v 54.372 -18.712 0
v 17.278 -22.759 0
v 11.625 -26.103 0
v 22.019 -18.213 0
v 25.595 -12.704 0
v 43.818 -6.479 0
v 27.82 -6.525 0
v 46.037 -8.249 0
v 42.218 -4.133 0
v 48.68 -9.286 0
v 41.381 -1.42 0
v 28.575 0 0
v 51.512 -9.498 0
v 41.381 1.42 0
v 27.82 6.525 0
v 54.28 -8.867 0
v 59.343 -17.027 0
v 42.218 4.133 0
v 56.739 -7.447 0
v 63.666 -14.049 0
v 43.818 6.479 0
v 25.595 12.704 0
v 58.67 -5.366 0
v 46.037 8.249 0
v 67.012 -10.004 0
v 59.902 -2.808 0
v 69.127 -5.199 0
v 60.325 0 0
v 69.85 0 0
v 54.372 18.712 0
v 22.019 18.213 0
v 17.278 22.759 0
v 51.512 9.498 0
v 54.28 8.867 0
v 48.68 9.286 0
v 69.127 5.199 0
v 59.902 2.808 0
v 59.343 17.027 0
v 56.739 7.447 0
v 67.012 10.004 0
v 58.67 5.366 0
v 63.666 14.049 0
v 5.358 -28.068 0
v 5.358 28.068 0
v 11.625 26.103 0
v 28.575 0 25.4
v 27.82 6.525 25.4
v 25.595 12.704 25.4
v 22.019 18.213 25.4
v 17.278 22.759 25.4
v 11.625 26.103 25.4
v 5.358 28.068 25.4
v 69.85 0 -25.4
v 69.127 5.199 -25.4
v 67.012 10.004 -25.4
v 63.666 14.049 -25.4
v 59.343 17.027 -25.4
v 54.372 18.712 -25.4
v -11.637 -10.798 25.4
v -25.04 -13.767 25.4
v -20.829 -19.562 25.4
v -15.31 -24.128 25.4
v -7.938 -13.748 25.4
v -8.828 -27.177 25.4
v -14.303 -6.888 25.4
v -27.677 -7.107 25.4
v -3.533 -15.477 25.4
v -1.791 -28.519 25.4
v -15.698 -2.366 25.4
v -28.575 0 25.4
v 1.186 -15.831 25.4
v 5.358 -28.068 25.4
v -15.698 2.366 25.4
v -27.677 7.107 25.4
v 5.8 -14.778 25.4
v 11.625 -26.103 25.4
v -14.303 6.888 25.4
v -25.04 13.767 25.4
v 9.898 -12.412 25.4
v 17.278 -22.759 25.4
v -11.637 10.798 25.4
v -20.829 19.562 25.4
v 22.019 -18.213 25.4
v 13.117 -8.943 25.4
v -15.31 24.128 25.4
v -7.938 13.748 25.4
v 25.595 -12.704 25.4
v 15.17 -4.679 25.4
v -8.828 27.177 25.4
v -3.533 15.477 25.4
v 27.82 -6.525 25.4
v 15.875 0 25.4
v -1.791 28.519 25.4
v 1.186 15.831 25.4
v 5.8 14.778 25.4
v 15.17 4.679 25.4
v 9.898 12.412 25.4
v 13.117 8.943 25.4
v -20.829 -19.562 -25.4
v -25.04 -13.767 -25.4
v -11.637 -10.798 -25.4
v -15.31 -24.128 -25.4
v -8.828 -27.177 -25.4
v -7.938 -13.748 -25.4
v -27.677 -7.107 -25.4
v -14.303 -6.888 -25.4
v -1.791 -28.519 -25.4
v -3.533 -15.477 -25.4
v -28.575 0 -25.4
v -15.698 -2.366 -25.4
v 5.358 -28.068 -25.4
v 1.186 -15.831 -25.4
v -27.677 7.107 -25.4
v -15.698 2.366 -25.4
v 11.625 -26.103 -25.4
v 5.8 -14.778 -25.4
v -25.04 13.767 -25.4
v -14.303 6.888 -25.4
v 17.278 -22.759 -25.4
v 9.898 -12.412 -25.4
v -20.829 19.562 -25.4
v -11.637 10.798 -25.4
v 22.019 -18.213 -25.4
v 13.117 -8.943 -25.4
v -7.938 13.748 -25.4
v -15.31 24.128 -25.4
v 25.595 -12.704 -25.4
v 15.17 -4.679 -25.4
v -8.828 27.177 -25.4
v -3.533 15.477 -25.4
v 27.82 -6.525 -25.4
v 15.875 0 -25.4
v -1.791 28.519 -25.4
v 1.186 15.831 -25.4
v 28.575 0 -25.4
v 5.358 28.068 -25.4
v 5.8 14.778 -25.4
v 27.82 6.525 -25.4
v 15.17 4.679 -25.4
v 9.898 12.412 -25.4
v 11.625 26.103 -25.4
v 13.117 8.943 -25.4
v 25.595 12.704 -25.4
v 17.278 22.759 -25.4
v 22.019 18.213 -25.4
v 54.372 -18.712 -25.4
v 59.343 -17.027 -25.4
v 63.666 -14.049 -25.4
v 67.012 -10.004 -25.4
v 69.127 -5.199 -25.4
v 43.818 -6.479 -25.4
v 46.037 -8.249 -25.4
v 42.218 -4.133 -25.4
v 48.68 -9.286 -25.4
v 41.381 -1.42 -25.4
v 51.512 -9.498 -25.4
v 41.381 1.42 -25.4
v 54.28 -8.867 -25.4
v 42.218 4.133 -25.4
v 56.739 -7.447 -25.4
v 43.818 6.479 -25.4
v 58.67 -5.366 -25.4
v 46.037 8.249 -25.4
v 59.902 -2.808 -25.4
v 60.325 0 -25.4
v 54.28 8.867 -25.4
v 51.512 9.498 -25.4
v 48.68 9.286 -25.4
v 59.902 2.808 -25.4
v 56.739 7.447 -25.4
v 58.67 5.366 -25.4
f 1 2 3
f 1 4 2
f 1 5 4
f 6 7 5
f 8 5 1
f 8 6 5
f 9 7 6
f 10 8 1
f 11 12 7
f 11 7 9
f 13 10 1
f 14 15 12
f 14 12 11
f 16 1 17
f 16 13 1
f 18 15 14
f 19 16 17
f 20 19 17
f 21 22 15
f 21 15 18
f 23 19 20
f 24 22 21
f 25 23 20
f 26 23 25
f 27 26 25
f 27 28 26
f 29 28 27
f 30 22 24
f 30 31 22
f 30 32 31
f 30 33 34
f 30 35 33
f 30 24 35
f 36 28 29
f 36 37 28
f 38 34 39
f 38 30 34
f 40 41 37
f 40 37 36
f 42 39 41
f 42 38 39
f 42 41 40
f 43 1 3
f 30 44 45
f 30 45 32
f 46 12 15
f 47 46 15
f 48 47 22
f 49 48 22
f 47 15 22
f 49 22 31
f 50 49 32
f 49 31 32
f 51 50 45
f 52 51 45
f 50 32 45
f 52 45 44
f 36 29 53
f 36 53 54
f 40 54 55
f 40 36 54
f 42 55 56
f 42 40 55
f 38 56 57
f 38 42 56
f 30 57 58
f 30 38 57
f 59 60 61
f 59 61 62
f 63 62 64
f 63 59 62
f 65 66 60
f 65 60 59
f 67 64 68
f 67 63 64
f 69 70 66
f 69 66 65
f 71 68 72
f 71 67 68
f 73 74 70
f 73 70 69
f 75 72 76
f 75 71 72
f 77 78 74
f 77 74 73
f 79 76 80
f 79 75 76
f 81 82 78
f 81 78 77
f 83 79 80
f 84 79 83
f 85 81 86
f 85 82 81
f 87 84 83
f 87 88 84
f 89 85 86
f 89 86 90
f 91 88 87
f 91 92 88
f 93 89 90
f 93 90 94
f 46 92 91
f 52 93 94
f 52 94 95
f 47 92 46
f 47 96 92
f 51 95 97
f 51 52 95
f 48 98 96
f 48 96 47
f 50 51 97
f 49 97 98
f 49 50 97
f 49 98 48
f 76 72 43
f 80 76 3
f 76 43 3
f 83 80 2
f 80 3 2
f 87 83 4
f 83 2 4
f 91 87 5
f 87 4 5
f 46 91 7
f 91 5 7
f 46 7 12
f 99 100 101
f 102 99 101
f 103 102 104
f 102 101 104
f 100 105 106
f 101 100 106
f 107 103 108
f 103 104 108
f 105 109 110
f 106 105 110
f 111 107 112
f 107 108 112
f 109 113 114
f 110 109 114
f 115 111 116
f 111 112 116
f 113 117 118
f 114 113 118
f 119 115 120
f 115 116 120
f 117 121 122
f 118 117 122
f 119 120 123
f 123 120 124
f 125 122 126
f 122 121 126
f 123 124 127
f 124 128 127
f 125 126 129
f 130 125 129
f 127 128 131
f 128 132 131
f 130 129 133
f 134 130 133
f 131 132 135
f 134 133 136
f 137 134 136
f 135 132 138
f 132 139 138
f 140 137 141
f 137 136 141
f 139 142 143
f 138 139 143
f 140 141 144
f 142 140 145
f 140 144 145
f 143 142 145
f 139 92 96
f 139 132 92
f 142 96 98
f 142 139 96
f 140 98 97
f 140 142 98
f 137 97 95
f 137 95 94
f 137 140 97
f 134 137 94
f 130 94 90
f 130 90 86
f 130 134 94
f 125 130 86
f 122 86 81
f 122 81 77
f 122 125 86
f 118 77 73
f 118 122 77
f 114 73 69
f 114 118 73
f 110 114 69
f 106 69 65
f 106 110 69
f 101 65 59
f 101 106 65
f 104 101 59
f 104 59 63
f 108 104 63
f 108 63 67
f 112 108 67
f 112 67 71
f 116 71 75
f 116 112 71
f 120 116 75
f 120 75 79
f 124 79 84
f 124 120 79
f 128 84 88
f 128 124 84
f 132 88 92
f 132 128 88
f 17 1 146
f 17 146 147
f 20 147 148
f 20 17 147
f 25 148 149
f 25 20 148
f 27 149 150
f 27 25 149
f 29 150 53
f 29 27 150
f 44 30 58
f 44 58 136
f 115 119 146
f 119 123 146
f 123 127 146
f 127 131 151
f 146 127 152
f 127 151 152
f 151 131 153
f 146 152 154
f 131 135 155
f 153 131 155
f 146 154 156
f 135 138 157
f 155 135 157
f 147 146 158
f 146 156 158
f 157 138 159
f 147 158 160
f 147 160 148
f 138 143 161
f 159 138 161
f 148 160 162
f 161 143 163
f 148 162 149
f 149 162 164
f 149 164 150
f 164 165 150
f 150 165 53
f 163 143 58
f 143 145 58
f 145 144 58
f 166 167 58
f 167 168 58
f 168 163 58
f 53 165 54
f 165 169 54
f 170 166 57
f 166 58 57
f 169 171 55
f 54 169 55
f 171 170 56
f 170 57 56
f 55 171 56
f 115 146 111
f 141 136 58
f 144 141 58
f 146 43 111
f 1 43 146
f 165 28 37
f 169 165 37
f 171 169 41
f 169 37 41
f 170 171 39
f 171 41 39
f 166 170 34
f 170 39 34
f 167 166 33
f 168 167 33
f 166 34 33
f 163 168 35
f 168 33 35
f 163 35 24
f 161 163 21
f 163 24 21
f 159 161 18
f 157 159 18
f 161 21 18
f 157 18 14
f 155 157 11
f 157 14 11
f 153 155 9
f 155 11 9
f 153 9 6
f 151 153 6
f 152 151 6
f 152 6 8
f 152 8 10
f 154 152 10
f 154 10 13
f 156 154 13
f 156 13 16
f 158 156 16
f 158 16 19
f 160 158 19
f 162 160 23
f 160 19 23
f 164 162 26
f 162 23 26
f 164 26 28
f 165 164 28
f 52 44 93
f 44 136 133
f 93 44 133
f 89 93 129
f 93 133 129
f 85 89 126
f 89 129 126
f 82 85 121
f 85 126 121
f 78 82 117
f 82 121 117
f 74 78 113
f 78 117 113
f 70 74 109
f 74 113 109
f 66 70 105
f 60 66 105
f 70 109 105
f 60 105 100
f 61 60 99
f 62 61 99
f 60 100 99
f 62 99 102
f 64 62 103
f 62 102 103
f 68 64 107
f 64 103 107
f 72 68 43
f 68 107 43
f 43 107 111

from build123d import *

# Parameters (mm, degrees)
F0_R     = 15.875
F0_R_2   = 9.525
F1_DEPTH = 25.4
F2_DEPTH = 25.4


with BuildPart() as f1:
    # F0 (on Top) → F1 (new body)
    with BuildSketch(Plane.XY):
        with BuildLine():
            ThreePointArc((5.357812, -28.068211), (22.018516, -18.21306), (28.575, 0))
            ThreePointArc((28.575, 0), (22.018516, 18.21306), (5.357812, 28.068211))
            ThreePointArc((5.357812, 28.068211), (-28.575, 0), (5.357812, -28.068211))
        make_face()
        Circle(F0_R, mode=Mode.SUBTRACT)
        with BuildLine():
            ThreePointArc((69.85, 0), (65.479011, 12.14204), (54.371875, 18.712141))
            ThreePointArc((54.371875, 18.712141), (31.75, 0), (54.371875, -18.712141))
            ThreePointArc((54.371875, -18.712141), (65.479011, -12.14204), (69.85, 0))
        make_face()
        with Locations((50.8, 0)):
            Circle(F0_R_2, mode=Mode.SUBTRACT)
        with BuildLine():
            ThreePointArc((5.357812, 28.068211), (22.018516, 18.21306), (28.575, 0))
            ThreePointArc((28.575, 0), (22.018516, -18.21306), (5.357812, -28.068211))
            Line((5.357813, -28.068211), (54.371875, -18.712141))
            ThreePointArc((54.371875, -18.712141), (31.75, 0), (54.371875, 18.712141))
            Line((54.371875, 18.712141), (5.357812, 28.068211))
        make_face()
    extrude(amount=-F1_DEPTH)

    # F0 (on Top) → F2 (join)
    with BuildSketch(Plane.XY):
        with BuildLine():
            ThreePointArc((5.357812, -28.068211), (22.018516, -18.21306), (28.575, 0))
            ThreePointArc((28.575, 0), (22.018516, 18.21306), (5.357812, 28.068211))
            ThreePointArc((5.357812, 28.068211), (-28.575, 0), (5.357812, -28.068211))
        make_face()
        Circle(F0_R, mode=Mode.SUBTRACT)
    extrude(amount=F2_DEPTH)


solid = f1.part
